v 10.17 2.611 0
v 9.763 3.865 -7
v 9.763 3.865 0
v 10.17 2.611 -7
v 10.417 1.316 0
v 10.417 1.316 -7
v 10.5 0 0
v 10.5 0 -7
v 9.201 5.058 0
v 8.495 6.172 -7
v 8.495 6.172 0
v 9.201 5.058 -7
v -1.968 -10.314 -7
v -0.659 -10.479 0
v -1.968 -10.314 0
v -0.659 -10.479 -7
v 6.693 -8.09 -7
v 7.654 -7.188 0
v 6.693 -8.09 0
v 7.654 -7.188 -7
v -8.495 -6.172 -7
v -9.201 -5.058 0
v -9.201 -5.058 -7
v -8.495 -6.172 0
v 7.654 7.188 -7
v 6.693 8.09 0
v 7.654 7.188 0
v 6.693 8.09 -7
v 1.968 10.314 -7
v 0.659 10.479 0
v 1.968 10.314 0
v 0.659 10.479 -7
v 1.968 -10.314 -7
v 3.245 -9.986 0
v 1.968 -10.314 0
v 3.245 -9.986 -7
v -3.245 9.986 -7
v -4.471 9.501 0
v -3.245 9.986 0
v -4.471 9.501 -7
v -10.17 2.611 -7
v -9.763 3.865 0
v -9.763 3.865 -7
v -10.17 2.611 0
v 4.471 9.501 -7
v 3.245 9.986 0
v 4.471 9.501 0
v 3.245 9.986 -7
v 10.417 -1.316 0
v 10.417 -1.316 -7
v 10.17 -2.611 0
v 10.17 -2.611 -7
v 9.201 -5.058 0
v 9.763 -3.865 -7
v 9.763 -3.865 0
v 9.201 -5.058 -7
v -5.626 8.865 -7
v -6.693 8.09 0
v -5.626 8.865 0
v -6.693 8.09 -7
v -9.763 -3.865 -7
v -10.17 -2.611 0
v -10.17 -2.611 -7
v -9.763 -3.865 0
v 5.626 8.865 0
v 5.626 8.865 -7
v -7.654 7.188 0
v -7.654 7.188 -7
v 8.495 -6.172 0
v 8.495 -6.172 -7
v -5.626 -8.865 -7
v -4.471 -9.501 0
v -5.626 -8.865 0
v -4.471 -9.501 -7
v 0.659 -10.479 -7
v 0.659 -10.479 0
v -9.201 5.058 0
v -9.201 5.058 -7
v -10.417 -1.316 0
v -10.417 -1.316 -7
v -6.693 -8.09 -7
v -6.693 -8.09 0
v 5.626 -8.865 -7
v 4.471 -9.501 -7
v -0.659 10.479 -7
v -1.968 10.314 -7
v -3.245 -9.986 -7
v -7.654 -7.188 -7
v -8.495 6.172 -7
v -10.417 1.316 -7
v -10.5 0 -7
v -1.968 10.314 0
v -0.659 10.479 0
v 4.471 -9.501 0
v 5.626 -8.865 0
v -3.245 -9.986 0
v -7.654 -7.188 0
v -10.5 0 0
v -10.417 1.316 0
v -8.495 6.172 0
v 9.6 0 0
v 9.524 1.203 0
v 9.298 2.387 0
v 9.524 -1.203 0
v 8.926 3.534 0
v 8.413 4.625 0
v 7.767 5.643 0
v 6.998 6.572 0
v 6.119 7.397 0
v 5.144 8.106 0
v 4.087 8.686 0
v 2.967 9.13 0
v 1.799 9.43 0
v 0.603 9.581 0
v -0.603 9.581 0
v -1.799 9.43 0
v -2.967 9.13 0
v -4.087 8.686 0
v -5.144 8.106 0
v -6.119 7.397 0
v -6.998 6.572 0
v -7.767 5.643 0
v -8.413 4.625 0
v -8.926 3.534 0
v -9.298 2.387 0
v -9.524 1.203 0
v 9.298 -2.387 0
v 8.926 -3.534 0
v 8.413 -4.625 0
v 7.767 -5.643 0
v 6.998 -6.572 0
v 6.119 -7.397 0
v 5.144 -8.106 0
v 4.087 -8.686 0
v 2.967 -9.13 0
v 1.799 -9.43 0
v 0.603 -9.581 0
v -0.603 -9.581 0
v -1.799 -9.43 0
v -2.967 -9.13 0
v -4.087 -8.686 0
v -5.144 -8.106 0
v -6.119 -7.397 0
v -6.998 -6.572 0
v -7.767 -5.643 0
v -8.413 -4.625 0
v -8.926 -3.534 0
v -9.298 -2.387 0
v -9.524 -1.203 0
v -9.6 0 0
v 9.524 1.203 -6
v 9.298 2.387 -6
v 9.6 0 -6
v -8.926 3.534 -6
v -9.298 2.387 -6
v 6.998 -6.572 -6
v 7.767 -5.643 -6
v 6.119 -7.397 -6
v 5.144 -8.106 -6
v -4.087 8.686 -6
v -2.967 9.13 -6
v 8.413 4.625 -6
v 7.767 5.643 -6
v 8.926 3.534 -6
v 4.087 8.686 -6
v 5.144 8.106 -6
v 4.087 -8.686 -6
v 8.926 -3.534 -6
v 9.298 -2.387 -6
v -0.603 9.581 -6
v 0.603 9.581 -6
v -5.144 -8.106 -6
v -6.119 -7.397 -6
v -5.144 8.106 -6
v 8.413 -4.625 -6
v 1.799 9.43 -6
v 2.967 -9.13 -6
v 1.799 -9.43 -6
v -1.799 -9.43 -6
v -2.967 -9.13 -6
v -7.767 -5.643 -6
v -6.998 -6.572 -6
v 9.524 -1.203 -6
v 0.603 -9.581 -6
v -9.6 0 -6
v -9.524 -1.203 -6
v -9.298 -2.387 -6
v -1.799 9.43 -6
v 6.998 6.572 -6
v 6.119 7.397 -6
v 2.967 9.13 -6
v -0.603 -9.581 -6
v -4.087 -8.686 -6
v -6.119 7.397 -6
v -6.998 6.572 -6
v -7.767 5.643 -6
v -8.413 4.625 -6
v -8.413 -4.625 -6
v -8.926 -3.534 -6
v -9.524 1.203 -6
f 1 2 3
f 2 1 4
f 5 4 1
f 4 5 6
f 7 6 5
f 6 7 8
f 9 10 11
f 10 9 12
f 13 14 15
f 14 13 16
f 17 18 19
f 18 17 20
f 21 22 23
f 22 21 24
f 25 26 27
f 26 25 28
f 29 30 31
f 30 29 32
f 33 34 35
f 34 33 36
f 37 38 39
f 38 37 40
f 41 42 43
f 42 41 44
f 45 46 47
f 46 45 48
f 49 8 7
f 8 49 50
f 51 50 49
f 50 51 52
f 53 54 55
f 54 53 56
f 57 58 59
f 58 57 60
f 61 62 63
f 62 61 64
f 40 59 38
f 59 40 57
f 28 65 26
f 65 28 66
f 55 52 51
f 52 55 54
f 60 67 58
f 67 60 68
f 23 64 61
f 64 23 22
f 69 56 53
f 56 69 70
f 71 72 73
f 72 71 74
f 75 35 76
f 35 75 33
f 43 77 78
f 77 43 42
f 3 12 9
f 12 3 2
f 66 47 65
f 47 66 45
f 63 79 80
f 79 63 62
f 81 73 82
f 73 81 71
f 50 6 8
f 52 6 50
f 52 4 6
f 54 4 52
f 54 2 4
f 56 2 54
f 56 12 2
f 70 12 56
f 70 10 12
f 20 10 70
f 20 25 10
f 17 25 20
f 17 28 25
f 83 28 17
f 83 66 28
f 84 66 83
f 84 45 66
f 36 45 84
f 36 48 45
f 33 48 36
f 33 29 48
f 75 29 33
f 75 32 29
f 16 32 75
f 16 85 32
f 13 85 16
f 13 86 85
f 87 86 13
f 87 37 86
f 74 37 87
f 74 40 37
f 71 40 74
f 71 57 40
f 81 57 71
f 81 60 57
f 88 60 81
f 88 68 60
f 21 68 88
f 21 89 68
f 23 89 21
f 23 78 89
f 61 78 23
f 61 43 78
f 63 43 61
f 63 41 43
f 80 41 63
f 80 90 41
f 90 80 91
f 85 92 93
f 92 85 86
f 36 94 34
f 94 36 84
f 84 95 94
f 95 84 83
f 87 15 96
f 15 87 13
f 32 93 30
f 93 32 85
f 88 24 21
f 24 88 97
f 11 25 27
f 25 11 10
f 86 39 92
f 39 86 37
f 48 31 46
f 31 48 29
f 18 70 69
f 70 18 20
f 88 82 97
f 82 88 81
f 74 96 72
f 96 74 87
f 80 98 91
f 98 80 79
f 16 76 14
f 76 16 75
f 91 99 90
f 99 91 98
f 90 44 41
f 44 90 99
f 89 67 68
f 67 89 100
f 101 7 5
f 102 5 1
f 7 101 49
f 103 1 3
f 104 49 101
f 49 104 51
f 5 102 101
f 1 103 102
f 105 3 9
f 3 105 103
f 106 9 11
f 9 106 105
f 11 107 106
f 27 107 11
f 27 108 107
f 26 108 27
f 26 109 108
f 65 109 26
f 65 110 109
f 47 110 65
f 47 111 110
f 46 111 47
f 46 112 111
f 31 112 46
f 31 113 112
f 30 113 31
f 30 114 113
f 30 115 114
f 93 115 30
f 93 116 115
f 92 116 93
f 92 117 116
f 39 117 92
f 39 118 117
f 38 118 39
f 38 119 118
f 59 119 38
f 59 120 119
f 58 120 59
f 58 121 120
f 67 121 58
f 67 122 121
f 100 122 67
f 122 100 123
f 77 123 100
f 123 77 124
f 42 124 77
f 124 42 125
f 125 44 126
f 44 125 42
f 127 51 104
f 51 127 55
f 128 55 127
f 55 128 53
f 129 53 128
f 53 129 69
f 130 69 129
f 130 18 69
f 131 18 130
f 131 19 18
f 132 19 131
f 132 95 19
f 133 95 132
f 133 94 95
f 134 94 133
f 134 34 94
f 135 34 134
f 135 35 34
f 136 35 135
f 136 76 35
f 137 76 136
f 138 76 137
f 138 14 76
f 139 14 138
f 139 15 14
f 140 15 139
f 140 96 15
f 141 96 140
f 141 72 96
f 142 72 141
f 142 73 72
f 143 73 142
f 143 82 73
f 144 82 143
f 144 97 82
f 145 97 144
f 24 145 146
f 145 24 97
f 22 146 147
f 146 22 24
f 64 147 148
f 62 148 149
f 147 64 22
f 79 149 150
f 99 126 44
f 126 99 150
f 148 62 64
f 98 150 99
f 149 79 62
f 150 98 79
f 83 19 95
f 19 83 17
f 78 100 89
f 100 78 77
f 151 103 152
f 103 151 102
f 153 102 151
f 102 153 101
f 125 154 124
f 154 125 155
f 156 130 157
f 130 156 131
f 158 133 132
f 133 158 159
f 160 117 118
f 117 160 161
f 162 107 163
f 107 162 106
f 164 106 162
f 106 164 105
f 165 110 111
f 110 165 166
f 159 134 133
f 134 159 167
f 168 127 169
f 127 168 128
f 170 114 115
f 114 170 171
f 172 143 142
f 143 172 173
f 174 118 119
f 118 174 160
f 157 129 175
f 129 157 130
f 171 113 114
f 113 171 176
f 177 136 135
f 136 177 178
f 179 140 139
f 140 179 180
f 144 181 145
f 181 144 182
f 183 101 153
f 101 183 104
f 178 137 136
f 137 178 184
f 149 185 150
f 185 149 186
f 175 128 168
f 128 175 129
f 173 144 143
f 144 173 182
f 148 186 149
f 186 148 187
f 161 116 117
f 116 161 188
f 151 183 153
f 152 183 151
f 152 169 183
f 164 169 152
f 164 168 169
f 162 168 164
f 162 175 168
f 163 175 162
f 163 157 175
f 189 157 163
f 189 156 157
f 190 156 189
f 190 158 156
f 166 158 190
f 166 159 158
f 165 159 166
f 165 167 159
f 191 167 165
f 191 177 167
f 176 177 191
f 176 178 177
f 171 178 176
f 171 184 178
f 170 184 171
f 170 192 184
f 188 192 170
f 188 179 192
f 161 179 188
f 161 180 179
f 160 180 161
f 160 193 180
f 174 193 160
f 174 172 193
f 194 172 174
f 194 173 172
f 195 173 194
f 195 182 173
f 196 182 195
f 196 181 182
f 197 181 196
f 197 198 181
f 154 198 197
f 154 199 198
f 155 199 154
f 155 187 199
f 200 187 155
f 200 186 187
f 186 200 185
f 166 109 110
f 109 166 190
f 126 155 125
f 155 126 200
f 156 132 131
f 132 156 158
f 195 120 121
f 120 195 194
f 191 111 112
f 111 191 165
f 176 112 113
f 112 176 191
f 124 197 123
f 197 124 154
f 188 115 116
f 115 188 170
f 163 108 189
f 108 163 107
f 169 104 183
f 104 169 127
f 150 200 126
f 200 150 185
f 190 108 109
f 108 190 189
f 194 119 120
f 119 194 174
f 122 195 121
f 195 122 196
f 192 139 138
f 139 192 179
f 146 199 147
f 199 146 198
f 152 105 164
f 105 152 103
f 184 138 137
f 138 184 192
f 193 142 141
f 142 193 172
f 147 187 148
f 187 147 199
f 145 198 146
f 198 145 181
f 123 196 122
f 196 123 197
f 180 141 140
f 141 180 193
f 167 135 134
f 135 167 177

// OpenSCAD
$fn = 50;


difference() {
	union() {
		translate(v = [0, 0, -7.0000000000]) {
			cylinder(h = 7, r = 10.5000000000);
		}
	}
	union() {
		#translate(v = [0, 0, -6.0000000000]) {
			cylinder(h = 6, r = 9.6000000000);
		}
	}
}
